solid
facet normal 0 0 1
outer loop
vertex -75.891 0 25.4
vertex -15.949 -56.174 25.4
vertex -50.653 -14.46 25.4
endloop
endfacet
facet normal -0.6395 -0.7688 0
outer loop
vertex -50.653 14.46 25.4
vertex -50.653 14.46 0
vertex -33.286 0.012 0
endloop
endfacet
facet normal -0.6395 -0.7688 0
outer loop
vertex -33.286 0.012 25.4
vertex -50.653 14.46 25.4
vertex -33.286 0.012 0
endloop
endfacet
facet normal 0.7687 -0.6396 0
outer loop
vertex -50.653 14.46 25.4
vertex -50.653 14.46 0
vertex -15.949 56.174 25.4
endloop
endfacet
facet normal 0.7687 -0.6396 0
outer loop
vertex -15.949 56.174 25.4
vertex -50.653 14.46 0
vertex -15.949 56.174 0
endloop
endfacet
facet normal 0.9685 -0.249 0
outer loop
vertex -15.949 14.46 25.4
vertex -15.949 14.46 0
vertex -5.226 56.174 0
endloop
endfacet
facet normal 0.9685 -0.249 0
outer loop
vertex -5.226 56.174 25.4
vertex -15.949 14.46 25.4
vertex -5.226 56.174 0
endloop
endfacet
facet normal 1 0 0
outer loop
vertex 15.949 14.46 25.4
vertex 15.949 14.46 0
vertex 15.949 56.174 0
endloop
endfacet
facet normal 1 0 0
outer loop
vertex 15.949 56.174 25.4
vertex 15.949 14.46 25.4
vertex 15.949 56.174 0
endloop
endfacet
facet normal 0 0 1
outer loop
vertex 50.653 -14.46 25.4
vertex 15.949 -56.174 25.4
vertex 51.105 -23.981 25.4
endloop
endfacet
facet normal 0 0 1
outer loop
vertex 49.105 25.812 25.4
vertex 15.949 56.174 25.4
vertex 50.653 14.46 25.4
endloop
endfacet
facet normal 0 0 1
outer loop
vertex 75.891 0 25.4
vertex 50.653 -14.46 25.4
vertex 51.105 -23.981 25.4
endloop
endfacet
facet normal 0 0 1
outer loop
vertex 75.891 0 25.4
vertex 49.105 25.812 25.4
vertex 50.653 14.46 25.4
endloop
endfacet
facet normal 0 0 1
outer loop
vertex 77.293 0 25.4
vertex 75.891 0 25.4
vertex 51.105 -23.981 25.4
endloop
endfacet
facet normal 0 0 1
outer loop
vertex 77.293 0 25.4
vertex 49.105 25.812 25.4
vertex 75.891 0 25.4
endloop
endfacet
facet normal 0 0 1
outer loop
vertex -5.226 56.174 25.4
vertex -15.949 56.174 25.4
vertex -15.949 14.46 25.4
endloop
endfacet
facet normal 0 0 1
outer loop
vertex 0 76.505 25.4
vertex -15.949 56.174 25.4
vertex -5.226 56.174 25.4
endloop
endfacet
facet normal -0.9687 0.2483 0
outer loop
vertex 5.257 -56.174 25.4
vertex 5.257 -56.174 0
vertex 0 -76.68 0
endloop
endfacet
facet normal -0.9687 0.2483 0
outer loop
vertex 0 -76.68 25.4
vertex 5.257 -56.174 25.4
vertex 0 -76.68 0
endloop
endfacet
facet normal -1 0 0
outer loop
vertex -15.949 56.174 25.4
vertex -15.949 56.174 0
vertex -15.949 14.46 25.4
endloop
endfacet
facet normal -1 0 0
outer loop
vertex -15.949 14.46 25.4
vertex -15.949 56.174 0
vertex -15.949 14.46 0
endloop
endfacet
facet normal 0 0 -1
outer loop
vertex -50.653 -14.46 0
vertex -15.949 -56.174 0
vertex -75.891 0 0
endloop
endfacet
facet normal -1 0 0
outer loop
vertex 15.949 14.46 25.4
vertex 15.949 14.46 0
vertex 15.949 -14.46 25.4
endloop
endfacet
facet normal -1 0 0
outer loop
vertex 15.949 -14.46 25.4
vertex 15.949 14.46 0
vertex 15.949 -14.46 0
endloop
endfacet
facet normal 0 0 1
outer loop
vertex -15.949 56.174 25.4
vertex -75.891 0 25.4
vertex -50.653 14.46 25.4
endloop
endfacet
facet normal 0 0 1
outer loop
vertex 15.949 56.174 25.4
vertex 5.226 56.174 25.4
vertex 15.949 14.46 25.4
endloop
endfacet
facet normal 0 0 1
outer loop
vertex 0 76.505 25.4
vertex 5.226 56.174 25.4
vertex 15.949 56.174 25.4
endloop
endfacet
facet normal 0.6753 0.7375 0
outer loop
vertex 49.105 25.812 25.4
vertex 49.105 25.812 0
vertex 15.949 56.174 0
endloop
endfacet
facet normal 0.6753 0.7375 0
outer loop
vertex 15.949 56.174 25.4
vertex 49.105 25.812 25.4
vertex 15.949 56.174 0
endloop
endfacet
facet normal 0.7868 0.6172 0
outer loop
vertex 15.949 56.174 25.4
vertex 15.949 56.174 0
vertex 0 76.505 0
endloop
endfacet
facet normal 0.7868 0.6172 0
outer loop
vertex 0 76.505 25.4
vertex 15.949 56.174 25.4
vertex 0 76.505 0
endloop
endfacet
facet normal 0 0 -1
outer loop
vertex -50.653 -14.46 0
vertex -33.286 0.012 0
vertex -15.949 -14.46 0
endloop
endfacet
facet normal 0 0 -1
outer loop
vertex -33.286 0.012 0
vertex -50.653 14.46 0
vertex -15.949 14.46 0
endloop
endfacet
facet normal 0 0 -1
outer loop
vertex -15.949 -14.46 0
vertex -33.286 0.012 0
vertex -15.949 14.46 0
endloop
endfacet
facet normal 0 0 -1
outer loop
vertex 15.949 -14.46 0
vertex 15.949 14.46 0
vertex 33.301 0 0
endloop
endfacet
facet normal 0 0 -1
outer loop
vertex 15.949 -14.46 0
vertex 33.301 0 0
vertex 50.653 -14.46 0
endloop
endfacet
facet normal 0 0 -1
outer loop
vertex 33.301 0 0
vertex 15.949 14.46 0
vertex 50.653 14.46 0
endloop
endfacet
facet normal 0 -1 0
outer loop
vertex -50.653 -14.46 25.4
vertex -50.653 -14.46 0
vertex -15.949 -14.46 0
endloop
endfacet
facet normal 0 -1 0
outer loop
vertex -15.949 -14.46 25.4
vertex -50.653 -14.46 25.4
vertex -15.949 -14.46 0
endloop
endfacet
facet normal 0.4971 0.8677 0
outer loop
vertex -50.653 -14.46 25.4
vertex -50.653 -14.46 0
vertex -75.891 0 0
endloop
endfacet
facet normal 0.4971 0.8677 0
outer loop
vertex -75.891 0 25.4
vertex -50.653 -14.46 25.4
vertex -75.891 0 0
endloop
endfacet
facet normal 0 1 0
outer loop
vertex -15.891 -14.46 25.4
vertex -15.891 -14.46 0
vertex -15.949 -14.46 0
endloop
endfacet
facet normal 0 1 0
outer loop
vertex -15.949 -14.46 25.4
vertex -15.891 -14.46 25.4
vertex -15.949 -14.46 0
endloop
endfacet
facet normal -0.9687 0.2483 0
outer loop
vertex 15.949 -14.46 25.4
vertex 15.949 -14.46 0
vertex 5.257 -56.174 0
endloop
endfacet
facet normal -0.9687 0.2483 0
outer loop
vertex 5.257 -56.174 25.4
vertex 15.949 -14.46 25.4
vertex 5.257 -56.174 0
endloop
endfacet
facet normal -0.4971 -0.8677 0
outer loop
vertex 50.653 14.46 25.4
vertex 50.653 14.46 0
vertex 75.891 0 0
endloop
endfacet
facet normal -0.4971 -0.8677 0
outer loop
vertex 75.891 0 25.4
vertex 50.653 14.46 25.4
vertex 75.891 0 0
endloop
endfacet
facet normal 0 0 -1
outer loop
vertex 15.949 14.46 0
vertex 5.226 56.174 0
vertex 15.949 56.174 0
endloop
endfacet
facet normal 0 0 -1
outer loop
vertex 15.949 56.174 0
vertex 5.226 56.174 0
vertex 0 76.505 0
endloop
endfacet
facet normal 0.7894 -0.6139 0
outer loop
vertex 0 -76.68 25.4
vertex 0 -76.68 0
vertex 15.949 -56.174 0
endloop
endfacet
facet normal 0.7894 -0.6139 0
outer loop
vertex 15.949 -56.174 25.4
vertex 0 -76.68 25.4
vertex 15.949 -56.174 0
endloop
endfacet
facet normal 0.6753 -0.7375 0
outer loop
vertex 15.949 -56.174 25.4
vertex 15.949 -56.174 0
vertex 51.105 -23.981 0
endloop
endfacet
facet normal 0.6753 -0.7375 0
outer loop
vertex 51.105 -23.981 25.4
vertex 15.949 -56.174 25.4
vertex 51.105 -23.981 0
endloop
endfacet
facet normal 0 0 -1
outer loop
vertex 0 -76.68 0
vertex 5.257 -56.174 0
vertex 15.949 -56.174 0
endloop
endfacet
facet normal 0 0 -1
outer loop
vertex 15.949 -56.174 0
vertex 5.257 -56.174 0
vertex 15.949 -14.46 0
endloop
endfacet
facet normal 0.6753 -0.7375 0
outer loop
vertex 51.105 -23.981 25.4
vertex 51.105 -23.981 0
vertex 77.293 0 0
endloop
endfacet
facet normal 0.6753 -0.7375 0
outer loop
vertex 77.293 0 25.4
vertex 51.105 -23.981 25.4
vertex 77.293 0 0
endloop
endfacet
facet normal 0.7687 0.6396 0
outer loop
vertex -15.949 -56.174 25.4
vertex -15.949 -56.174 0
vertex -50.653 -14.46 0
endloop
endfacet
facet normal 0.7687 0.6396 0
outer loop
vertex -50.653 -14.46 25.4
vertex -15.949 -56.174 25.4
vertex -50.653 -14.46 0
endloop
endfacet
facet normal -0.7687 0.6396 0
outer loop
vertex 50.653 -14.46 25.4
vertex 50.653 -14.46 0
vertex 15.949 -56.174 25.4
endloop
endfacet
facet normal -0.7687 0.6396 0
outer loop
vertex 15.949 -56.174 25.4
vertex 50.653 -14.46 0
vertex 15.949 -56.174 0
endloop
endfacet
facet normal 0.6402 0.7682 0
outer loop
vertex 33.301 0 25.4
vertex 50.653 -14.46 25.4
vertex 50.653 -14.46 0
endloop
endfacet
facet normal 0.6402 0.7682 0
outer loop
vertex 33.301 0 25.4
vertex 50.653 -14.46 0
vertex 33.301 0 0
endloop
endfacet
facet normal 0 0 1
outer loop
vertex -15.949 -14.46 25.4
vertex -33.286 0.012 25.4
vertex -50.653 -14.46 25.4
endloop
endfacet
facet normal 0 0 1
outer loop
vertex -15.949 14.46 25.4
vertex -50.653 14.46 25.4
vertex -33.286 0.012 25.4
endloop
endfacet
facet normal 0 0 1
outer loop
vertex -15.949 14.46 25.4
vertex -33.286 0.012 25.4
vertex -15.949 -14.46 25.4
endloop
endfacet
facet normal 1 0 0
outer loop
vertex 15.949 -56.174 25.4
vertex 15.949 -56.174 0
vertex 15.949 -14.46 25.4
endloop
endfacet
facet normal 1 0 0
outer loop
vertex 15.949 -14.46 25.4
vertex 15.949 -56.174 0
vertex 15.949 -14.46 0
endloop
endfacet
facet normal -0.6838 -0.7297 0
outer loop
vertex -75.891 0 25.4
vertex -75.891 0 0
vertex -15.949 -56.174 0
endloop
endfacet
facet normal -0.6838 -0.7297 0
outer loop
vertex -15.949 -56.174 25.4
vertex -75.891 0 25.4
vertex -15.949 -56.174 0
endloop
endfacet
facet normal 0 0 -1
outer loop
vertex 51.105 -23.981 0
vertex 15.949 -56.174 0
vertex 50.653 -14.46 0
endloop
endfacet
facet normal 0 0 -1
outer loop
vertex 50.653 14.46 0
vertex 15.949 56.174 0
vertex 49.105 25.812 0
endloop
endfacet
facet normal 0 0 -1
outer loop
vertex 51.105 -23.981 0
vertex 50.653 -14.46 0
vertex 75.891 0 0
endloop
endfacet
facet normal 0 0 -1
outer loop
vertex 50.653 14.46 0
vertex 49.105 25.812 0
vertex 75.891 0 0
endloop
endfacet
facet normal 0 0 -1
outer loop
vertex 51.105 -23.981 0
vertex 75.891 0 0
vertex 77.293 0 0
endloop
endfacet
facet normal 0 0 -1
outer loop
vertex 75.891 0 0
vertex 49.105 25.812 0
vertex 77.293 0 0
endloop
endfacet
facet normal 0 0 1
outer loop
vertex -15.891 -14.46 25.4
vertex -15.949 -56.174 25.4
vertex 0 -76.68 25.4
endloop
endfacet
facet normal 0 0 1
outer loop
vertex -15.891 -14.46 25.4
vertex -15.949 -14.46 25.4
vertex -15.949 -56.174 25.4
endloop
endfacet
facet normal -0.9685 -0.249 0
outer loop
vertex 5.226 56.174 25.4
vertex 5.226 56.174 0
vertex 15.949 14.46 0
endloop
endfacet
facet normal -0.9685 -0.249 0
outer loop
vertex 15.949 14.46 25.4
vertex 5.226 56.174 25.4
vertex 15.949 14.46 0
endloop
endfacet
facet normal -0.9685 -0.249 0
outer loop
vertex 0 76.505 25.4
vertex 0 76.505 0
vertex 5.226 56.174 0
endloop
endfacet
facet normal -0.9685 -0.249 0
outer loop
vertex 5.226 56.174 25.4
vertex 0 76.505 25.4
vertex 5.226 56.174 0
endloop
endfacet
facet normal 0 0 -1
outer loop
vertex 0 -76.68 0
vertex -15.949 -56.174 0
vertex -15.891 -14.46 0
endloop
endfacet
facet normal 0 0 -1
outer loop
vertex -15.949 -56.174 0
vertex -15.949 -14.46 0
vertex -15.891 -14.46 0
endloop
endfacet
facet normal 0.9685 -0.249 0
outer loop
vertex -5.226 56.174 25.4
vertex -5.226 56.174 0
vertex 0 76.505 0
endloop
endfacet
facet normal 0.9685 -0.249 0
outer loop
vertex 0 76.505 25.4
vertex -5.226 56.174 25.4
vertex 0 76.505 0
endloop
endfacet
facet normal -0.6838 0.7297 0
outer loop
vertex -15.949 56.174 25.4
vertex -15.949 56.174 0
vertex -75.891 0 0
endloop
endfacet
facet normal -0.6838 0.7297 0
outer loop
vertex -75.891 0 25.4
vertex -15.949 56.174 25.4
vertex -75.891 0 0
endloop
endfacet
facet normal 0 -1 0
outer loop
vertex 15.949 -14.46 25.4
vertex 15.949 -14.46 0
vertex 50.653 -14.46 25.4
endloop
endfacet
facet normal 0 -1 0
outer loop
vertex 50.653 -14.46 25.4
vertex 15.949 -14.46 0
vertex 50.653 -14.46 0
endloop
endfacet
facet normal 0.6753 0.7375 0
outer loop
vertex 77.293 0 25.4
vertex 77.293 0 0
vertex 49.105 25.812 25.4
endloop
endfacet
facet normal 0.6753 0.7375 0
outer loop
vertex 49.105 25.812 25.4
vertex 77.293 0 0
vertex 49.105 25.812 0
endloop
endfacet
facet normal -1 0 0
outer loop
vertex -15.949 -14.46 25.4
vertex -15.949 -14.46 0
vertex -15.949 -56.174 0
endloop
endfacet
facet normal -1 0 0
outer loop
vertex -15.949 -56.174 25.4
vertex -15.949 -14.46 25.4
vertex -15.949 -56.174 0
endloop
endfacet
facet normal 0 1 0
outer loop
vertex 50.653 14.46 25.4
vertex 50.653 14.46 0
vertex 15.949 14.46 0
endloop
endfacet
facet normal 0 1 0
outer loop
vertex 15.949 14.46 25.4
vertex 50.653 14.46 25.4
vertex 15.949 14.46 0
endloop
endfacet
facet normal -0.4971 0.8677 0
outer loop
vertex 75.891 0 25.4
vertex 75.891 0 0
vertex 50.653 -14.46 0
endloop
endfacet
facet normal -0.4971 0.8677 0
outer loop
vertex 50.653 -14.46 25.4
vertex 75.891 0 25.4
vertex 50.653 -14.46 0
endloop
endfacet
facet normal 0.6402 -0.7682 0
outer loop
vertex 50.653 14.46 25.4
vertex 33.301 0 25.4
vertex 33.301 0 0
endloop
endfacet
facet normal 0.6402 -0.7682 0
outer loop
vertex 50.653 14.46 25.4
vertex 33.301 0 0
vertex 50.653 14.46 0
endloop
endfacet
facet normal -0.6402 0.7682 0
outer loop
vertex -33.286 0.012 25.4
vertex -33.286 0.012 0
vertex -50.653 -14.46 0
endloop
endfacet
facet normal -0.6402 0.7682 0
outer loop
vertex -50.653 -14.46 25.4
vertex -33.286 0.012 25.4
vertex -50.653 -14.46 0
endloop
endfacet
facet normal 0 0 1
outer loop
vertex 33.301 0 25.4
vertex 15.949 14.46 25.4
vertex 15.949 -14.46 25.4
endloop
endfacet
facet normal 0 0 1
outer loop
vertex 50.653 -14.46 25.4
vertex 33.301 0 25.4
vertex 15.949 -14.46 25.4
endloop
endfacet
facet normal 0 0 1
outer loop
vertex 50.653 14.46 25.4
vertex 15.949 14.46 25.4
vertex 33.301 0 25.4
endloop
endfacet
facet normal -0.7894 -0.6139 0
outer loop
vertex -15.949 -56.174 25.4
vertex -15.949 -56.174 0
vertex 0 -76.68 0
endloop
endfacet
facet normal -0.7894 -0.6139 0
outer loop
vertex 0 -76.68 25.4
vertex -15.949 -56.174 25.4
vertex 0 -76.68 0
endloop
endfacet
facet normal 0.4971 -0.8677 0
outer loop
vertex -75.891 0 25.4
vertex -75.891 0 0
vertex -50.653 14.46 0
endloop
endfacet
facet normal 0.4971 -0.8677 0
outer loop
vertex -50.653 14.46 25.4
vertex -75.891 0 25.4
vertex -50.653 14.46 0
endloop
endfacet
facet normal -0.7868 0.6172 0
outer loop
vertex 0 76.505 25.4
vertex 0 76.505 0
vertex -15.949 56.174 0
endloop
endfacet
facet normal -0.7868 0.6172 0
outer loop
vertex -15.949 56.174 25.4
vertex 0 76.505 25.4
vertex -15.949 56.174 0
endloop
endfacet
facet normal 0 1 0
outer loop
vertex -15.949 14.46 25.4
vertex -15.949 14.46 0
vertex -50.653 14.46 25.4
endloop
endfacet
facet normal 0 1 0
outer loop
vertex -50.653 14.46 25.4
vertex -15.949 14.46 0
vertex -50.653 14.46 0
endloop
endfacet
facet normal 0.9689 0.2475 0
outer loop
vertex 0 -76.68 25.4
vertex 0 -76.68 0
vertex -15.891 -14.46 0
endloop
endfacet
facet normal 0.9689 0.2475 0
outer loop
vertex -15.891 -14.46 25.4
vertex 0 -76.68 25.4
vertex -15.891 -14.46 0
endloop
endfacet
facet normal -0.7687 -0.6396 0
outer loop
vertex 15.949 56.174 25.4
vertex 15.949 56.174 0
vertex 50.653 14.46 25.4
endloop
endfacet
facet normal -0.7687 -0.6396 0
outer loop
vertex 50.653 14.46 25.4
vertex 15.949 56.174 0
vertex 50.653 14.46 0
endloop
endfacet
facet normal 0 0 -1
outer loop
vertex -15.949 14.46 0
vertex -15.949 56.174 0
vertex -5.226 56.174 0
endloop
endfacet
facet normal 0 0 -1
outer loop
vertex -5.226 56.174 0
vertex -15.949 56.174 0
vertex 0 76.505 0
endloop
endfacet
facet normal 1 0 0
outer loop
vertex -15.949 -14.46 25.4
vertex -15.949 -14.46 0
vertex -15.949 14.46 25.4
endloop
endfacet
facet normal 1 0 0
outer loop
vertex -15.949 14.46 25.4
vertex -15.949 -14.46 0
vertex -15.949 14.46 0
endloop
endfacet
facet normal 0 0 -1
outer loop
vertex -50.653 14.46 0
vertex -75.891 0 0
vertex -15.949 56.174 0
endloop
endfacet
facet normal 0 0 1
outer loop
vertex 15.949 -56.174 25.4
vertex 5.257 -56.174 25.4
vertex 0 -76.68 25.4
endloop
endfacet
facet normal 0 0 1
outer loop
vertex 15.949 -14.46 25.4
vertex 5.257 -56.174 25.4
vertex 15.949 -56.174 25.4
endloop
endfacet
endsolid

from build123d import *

# Parameters (mm, degrees)
F1_DEPTH = 25.4


with BuildPart() as f1:
    # F0 (on Top) → F1 (new body)
    with BuildSketch(Plane.XY):
        Polygon((5.2263641986, 56.1735033989), (15.9494206309, 56.1735033989), (0, 76.5046328306), align=None)
        Polygon((5.2263641986, 56.1735033989), (15.9494206309, 14.4596388564), (15.9494206309, 56.1735033989), align=None)
    extrude(amount=F1_DEPTH)


with BuildPart() as f1b:
    # F0 (on Top) → F1, piece 2 (new body)
    with BuildSketch(Plane.XY):
        Polygon((-5.2263641986, 56.1735033989), (0, 76.5046328306), (-15.9494206309, 56.1735033989), align=None)
        Polygon((-15.9494206309, 56.1735033989), (-15.9494206309, 14.4596388564), (-5.2263641986, 56.1735033989), align=None)
    extrude(amount=F1_DEPTH)


with BuildPart() as f1c:
    # F0 (on Top) → F1, piece 3 (new body)
    with BuildSketch(Plane.XY):
        Polygon((0, -76.6799002886), (15.9494206309, -56.1735033989), (5.256569839, -56.1735033989), align=None)
        Polygon((15.9494206309, -56.1735033989), (15.9494206309, -14.4596388564), (5.256569839, -56.1735033989), align=None)
    extrude(amount=F1_DEPTH)


with BuildPart() as f1d:
    # F0 (on Top) → F1, piece 4 (new body)
    with BuildSketch(Plane.XY):
        Polygon((-15.9494206309, -56.1735033989), (0, -76.6799002886), (-5.2373147649, -56.1735033989), align=None)
        Polygon((-5.2373147649, -56.1735033989), (-15.890997118, -14.4596388564), (-15.9494206309, -14.4596388564), (-15.9494206309, -56.1735033989), align=None)
    extrude(amount=F1_DEPTH)


with BuildPart() as f1e:
    # F0 (on Top) → F1, piece 5 (new body)
    with BuildSketch(Plane.XY):
        with BuildLine():
            Line((-75.8911967278, 0), (-50.6525523961, 14.4596388564))
            ThreePointArc((-50.6525523961, 14.4596388564), (-50.327204748, 19.7034883297), (-49.3561521884, 24.8669043809))
            Line((-49.3561521884, 24.8669043809), (-75.8911967278, 0))
        make_face()
        with BuildLine():
            ThreePointArc((-49.3561521884, 24.8669043809), (-50.327204748, 19.7034883297), (-50.6525523961, 14.4596388564))
            Line((-50.6525523961, 14.4596388564), (-15.9494206309, 56.1735033989))
            Line((-15.9494206309, 56.1735033989), (-49.3561521884, 24.8669043809))
        make_face()
    extrude(amount=F1_DEPTH)


with BuildPart() as f1f:
    # F0 (on Top) → F1, piece 6 (new body)
    with BuildSketch(Plane.XY):
        with BuildLine():
            ThreePointArc((-51.1674289623, -23.1694945169), (-51.1801863692, -18.7985942716), (-50.6525523961, -14.4596388564))
            Line((-50.6525523961, -14.4596388564), (-75.8911967278, 0))
            Line((-75.8911967278, 0), (-51.1674289623, -23.1694945169))
        make_face()
        with BuildLine():
            Line((-51.1674289623, -23.1694945169), (-15.9494206309, -56.1735033989))
            Line((-15.9494206309, -56.1735033989), (-50.6525523961, -14.4596388564))
            ThreePointArc((-50.6525523961, -14.4596388564), (-51.1801863692, -18.7985942716), (-51.1674289623, -23.1694945169))
        make_face()
    extrude(amount=F1_DEPTH)


with BuildPart() as f1g:
    # F0 (on Top) → F1, piece 7 (new body)
    with BuildSketch(Plane.XY):
        with BuildLine():
            Line((15.9494206309, 56.1735033989), (50.6525523961, 14.4596388564))
            ThreePointArc((50.6525523961, 14.4596388564), (50.2639622803, 20.1883867551), (49.1053109848, 25.8121827987))
            Line((49.1053109848, 25.8121827987), (15.9494206309, 56.1735033989))
        make_face()
        with BuildLine():
            ThreePointArc((51.1053201889, -23.9807459107), (51.2018522384, -19.2048364024), (50.6525523961, -14.4596388564))
            Line((50.6525523961, -14.4596388564), (15.9494206309, -56.1735033989))
            Line((15.9494206309, -56.1735033989), (51.1053201889, -23.9807459107))
        make_face()
        with BuildLine():
            Line((75.8911967278, 0), (50.6525523961, -14.4596388564))
            ThreePointArc((50.6525523961, -14.4596388564), (51.2018522384, -19.2048364024), (51.1053201889, -23.9807459107))
            Line((51.1053201889, -23.9807459107), (77.293343842, 0))
            Line((77.293343842, 0), (49.1053109848, 25.8121827987))
            ThreePointArc((49.1053109848, 25.8121827987), (50.2639622803, 20.1883867551), (50.6525523961, 14.4596388564))
            Line((50.6525523961, 14.4596388564), (75.8911967278, 0))
        make_face()
    extrude(amount=F1_DEPTH)


with BuildPart() as f1h:
    # F0 (on Top) → F1, piece 8 (new body)
    with BuildSketch(Plane.XY):
        Polygon((33.3009865135, 0), (50.6525523961, 14.4596388564), (15.9494206309, 14.4596388564), align=None)
        Polygon((15.9494206309, -14.4596388564), (50.6525523961, -14.4596388564), (33.3009865135, 0), align=None)
        Polygon((15.9494206309, 14.4596388564), (15.9494206309, -14.4596388564), (33.3009865135, 0), align=None)
    extrude(amount=F1_DEPTH)


with BuildPart() as f1i:
    # F0 (on Top) → F1, piece 9 (new body)
    with BuildSketch(Plane.XY):
        Polygon((-33.2863929196, 0.0121613288), (-15.9494206309, 14.4596388564), (-50.6525523961, 14.4596388564), align=None)
        Polygon((-50.6525523961, -14.4596388564), (-15.9494206309, -14.4596388564), (-15.9494206309, -14.4110344201), (-33.2863929196, 0.0121613288), align=None)
        Polygon((-33.2863929196, 0.0121613288), (-15.9494206309, -14.4110344201), (-15.9494206309, 14.4596388564), align=None)
    extrude(amount=F1_DEPTH)


solid = Compound([f1.part, f1b.part, f1c.part, f1d.part, f1e.part, f1f.part, f1g.part, f1h.part, f1i.part])
